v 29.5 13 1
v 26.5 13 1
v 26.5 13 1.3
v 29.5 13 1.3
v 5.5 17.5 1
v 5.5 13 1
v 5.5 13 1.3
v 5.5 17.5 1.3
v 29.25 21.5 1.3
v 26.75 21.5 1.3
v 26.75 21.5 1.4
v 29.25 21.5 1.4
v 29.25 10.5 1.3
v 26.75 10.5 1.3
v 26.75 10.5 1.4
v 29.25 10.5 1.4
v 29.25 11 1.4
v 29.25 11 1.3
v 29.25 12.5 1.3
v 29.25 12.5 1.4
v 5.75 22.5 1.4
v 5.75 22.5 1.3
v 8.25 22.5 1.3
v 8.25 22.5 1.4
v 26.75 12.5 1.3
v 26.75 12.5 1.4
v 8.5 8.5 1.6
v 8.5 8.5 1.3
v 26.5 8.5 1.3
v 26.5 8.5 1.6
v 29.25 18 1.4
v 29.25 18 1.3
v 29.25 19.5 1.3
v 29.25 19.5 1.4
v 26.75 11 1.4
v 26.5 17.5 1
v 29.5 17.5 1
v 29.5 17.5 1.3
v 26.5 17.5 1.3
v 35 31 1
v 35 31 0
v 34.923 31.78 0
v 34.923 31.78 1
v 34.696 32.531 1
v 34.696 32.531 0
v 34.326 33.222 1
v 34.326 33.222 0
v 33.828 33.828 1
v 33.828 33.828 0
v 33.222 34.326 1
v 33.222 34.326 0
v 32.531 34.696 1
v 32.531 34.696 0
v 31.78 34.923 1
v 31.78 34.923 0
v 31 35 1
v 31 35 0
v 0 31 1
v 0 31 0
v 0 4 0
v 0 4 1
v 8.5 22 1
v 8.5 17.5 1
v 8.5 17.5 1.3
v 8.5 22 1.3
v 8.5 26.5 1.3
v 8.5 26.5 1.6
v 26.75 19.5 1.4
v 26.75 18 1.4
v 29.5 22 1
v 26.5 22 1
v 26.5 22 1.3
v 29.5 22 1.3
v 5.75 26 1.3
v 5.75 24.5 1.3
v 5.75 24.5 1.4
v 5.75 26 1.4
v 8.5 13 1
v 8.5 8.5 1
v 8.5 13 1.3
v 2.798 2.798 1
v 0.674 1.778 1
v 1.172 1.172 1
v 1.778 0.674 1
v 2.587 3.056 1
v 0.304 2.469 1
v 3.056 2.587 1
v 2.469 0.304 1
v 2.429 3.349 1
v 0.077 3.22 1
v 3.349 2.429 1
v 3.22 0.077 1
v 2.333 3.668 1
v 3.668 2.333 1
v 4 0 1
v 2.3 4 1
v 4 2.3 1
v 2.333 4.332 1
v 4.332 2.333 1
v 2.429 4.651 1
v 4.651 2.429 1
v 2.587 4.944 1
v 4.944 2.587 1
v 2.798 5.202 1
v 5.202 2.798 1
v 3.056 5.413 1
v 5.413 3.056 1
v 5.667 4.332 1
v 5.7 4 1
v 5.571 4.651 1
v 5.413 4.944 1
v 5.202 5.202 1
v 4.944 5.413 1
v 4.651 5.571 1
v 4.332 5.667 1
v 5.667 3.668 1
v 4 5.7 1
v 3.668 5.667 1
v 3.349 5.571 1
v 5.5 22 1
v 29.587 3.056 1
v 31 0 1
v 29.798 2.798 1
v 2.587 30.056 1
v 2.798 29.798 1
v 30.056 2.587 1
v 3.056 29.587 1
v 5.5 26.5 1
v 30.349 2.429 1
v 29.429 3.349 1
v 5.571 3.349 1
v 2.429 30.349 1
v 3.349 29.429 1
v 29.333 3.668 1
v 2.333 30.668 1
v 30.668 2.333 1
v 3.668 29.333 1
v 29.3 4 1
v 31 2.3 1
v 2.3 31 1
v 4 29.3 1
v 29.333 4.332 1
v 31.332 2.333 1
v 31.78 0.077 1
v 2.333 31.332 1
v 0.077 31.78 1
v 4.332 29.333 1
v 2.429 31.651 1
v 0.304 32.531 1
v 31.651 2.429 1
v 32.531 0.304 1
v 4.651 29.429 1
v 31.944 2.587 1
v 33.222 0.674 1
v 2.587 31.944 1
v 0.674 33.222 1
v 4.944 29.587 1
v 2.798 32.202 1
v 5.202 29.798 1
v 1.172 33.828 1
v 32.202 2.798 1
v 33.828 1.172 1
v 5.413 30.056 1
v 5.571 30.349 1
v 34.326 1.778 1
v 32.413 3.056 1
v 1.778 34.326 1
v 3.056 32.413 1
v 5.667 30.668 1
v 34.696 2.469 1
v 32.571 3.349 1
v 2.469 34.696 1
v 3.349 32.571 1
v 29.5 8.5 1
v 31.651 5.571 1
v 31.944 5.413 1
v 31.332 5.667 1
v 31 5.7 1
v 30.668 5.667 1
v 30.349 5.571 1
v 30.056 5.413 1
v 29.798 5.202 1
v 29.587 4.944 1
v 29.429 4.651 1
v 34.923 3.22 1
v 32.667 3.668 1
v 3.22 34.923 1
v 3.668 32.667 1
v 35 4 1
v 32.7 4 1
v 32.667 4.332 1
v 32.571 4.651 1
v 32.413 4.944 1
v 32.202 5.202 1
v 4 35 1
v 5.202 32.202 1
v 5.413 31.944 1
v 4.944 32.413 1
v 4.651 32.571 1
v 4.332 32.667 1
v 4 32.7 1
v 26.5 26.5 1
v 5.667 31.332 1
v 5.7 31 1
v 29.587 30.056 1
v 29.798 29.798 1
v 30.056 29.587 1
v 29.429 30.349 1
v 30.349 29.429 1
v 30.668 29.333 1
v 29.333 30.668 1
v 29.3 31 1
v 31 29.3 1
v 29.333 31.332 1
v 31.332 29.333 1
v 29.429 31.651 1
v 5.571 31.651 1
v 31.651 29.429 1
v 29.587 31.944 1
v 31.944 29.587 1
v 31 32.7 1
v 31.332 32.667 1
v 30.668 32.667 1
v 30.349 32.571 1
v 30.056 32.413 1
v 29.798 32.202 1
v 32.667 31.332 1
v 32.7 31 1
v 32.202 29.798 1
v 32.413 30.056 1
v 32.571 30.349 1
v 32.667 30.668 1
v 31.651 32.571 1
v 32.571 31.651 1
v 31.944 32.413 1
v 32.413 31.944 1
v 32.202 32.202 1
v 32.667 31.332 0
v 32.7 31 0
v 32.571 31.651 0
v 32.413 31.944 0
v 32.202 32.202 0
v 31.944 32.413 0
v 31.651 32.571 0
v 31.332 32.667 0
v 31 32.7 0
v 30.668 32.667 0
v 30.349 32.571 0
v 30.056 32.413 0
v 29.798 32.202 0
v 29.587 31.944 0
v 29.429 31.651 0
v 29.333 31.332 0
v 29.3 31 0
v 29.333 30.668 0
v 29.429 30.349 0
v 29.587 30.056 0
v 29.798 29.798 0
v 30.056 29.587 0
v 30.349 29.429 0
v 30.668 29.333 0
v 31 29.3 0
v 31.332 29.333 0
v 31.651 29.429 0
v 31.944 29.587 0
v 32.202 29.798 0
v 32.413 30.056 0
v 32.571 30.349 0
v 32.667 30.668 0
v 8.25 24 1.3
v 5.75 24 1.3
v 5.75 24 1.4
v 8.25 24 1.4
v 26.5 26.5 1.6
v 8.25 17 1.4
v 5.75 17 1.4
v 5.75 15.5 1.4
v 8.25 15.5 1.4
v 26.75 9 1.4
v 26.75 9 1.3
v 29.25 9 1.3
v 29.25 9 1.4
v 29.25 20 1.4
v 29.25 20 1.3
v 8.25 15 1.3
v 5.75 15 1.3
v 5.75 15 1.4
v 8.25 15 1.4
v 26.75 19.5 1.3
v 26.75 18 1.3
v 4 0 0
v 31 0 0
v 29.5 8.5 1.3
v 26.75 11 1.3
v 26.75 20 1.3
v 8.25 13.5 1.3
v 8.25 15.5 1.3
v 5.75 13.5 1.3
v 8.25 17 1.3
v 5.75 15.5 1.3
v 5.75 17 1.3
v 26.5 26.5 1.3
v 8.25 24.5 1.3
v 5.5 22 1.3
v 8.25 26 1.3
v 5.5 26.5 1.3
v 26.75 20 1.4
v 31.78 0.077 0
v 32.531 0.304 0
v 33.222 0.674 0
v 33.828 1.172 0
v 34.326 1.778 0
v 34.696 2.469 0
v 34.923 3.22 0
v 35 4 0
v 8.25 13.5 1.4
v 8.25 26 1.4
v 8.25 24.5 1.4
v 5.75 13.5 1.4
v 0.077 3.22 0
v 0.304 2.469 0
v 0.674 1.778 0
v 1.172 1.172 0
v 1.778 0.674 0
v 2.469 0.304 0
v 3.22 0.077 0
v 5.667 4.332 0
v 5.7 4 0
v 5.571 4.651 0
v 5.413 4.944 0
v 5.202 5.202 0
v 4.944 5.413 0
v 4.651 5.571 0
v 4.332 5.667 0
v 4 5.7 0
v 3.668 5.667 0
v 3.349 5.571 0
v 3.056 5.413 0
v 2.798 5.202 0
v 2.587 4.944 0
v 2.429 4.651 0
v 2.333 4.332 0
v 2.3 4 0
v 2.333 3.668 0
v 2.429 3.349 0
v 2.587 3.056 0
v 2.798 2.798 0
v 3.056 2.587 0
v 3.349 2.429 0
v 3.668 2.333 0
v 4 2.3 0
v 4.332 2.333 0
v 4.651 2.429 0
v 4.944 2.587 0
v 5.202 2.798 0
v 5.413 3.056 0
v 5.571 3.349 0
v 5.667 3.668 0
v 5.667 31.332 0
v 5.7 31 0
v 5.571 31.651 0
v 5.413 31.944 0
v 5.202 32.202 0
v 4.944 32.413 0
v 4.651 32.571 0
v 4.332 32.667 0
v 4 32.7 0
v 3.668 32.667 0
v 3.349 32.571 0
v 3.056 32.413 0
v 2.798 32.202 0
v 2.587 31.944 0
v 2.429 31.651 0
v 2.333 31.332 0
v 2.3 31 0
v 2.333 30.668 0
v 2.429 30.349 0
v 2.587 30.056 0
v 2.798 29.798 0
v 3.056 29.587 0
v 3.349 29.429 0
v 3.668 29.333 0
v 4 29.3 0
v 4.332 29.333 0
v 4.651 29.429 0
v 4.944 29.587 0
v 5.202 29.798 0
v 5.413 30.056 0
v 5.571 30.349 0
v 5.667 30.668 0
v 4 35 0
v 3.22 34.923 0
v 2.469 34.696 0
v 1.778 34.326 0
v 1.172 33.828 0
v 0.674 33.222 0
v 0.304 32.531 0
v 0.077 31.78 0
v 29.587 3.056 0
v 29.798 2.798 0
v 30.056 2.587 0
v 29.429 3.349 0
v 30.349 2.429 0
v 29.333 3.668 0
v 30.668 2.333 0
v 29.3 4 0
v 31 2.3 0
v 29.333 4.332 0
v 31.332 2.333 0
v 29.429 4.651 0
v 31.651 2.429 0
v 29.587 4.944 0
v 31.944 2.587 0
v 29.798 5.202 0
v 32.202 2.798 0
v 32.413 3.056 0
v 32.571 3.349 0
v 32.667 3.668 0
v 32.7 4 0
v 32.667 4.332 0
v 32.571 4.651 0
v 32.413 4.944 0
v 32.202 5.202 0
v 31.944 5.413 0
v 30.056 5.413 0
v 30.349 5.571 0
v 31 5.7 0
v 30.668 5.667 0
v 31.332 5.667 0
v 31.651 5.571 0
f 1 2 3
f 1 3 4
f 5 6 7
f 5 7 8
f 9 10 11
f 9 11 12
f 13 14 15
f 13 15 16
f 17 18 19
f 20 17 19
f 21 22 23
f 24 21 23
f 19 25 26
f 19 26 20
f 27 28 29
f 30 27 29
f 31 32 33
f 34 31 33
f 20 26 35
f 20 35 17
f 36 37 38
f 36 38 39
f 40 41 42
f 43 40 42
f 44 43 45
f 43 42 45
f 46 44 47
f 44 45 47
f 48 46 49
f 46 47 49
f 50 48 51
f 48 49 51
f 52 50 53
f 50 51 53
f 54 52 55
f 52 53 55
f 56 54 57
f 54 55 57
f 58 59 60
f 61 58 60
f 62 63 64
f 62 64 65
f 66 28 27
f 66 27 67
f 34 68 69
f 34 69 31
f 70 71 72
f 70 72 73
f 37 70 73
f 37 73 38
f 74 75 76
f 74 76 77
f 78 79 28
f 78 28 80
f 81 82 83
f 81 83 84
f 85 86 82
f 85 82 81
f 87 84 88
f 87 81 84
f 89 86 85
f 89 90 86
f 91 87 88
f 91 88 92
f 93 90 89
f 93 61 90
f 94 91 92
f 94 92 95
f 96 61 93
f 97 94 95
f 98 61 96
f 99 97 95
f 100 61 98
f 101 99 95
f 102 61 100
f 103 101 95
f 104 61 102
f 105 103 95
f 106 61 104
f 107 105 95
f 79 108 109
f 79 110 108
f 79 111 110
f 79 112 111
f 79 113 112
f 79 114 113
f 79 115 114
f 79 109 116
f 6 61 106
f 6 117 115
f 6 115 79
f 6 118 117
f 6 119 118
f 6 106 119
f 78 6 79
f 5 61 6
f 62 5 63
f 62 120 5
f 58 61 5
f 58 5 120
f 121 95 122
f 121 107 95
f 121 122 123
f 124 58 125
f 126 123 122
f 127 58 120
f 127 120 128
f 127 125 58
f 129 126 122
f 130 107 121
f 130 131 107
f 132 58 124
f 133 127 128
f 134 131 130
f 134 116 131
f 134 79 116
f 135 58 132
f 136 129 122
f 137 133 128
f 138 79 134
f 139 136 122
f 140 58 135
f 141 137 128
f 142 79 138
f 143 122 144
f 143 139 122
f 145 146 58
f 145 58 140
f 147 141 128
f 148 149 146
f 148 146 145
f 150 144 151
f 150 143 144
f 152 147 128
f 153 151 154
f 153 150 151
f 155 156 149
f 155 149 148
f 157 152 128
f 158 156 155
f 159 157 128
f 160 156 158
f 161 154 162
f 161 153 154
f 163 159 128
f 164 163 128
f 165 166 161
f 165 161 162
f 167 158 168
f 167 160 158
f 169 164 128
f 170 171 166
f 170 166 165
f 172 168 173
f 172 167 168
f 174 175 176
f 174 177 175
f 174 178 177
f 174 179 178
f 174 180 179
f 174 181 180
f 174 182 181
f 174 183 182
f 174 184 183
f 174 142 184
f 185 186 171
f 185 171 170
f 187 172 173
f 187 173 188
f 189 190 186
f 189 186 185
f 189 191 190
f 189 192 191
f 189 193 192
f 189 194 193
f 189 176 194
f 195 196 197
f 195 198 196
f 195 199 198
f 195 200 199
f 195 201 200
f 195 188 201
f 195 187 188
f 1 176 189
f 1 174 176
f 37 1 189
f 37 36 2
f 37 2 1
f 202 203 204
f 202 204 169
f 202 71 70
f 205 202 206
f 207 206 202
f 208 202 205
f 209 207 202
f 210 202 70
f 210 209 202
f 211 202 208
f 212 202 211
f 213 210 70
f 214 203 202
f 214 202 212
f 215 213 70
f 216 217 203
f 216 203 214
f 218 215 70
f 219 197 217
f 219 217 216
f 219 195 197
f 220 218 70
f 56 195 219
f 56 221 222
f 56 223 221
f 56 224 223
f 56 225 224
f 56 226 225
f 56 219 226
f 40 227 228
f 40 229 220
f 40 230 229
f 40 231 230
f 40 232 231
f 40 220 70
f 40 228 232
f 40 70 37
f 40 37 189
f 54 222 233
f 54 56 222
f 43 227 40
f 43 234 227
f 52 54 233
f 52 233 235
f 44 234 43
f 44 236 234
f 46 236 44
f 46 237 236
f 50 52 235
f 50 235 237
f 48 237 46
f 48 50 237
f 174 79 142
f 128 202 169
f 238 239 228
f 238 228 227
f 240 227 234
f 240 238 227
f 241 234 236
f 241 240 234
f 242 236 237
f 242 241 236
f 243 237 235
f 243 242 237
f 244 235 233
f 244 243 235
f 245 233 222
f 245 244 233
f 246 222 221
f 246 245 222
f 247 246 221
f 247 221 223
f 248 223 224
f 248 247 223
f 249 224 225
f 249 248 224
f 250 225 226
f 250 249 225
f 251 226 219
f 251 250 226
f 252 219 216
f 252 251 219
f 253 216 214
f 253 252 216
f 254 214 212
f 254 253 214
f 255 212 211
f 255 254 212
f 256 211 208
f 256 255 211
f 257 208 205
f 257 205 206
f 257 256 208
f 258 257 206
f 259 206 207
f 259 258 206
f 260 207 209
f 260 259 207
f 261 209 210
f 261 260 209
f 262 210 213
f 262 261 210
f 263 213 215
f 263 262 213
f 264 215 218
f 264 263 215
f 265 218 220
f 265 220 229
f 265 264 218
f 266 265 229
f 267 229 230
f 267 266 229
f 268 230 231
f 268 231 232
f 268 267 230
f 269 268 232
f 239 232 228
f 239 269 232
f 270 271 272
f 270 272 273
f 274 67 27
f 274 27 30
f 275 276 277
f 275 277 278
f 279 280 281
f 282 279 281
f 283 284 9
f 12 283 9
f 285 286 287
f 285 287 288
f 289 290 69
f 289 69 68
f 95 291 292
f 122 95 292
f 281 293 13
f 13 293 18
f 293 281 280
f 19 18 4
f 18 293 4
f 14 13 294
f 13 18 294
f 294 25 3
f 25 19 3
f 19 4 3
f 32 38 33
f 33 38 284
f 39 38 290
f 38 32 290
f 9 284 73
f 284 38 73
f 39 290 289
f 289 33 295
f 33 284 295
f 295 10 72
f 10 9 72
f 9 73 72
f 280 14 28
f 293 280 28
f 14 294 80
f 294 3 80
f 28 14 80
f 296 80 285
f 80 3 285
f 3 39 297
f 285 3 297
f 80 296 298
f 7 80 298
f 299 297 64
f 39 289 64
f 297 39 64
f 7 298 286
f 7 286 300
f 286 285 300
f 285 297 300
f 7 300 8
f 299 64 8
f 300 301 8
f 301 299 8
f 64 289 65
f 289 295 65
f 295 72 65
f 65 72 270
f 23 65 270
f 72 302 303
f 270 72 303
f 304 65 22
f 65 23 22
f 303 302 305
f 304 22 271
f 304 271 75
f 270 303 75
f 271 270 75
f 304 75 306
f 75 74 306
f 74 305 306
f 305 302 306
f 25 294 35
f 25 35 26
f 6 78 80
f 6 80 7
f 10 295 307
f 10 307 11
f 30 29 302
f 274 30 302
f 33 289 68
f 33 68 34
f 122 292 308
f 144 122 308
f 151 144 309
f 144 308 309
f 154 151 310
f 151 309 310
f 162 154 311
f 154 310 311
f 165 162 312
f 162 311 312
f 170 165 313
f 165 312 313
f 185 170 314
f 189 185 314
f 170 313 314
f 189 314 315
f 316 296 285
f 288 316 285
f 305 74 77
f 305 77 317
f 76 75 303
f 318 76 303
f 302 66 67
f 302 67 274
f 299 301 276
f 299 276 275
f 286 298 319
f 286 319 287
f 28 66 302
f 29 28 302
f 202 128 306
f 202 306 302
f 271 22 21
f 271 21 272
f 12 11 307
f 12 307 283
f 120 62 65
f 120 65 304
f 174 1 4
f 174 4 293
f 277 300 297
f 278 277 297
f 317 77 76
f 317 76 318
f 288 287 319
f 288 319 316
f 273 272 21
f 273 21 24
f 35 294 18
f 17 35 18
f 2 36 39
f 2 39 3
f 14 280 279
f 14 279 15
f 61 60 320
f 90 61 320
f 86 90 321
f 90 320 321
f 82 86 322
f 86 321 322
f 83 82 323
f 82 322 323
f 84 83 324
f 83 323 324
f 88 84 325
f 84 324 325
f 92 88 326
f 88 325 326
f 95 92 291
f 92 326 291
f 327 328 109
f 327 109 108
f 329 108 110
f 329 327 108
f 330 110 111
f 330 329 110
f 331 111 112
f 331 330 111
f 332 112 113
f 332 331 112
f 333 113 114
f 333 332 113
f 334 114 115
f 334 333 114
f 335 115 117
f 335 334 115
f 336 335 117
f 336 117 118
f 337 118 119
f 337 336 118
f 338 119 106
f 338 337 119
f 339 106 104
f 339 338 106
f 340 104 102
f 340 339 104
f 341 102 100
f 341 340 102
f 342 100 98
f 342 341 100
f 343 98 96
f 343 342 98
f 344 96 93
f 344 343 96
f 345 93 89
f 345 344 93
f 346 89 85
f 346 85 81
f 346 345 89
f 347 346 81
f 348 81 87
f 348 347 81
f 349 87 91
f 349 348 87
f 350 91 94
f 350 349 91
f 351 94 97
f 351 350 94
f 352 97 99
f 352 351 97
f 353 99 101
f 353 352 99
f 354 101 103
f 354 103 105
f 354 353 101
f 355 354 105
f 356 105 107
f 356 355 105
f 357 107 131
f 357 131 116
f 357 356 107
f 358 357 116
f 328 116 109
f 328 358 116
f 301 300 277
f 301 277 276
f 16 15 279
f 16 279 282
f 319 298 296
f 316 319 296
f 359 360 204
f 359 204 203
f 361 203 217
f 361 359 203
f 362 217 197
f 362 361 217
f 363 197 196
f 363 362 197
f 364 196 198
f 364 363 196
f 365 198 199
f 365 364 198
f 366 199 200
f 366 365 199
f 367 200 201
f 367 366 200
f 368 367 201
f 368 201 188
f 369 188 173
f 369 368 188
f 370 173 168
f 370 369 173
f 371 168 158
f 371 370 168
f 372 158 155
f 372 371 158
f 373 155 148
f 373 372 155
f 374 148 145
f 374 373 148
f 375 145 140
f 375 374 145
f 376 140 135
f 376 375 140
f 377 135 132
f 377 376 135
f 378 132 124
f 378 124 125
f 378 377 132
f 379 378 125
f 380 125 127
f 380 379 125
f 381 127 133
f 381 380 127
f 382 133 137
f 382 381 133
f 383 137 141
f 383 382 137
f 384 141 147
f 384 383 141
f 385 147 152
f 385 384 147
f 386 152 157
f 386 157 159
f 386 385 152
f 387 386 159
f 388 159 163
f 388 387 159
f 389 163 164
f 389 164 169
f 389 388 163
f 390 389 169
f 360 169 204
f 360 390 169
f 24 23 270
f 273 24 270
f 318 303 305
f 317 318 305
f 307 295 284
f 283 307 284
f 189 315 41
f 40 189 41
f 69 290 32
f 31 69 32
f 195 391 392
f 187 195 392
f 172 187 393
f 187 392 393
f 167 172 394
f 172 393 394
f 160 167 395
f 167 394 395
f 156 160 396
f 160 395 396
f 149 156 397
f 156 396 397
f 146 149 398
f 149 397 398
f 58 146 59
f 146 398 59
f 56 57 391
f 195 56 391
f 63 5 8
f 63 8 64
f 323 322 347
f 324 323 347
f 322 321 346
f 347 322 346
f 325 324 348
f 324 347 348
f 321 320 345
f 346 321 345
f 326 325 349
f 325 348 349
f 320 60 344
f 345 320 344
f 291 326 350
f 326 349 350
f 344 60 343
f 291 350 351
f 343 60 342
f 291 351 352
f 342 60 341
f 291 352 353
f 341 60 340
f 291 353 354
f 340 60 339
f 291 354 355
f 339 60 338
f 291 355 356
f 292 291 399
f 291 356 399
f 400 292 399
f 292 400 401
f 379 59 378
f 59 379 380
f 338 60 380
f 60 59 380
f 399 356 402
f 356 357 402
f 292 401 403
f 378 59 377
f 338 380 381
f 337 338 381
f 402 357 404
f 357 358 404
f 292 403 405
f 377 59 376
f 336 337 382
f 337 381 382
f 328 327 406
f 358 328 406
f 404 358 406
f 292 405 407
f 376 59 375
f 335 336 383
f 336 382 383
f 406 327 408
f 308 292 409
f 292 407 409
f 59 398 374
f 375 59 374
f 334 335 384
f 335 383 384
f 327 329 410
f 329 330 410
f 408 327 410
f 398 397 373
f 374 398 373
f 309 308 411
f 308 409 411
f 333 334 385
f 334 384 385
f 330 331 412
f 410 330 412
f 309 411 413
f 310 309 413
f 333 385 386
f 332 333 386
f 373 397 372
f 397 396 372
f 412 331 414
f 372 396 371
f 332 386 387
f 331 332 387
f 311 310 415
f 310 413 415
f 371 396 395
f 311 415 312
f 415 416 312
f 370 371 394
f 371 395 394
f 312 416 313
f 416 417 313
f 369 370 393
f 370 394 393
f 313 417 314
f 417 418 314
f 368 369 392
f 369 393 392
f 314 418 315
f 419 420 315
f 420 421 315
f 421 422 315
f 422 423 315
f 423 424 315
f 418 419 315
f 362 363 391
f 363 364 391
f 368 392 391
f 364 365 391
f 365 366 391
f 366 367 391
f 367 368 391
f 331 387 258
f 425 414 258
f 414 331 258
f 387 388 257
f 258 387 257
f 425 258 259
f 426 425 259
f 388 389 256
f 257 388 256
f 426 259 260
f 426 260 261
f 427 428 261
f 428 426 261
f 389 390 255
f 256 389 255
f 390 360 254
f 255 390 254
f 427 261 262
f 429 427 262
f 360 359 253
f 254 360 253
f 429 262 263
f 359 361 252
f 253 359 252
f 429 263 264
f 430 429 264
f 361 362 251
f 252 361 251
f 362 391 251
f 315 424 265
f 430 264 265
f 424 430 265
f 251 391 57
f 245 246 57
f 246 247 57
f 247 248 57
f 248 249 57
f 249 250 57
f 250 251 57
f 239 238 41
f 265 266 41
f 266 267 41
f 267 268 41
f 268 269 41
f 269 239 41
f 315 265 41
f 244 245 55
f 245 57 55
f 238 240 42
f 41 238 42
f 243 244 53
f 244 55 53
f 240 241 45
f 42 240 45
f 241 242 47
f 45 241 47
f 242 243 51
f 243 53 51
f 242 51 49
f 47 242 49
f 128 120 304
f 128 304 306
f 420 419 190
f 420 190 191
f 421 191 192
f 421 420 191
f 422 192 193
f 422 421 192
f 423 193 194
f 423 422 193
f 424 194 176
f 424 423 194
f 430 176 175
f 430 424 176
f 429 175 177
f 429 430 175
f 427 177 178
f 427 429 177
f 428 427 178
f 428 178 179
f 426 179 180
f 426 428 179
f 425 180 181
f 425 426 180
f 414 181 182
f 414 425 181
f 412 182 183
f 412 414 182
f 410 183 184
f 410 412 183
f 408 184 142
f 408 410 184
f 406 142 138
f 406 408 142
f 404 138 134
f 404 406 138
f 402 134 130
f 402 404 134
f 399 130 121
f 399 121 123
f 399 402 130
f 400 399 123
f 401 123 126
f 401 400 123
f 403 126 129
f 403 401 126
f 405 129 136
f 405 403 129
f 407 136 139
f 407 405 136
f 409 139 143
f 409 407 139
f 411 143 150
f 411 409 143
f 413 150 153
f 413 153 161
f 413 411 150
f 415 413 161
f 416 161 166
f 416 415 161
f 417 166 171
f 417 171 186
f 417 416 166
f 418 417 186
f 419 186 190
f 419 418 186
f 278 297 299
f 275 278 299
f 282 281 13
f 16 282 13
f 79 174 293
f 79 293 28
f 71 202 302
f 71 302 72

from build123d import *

# Parameters (mm, degrees)
SKETCH_20_R         = 1.7
BOSS_EXTRUDE1_DEPTH = 1
BOSS_EXTRUDE2_DEPTH = 0.3
SKETCH1_W           = 18
SKETCH1_H           = 18
BOSS_EXTRUDE3_DEPTH = 0.3
SKETCH2_W           = 2.5
SKETCH2_H           = 1.5
BOSS_EXTRUDE4_DEPTH = 0.1


with BuildPart() as part:
    # Sketch 20 → Boss-Extrude1 (new body)
    with BuildSketch(Plane.XY):
        with BuildLine():
            Line((4, 0), (31, 0))
            ThreePointArc((31, 0), (33.828427125, 1.171572875), (35, 4))
            Line((35, 4), (35, 31))
            ThreePointArc((35, 31), (33.828427125, 33.828427125), (31, 35))
            Line((31, 35), (4, 35))
            ThreePointArc((4, 35), (1.171572875, 33.828427125), (0, 31))
            Line((0, 31), (0, 4))
            ThreePointArc((0, 4), (1.171572875, 1.171572875), (4, 0))
        make_face()
        with Locations((4, 4)):
            Circle(SKETCH_20_R, mode=Mode.SUBTRACT)
        with Locations((31, 4)):
            Circle(SKETCH_20_R, mode=Mode.SUBTRACT)
        with Locations((31, 31)):
            Circle(SKETCH_20_R, mode=Mode.SUBTRACT)
        with Locations((4, 31)):
            Circle(SKETCH_20_R, mode=Mode.SUBTRACT)
    extrude(amount=BOSS_EXTRUDE1_DEPTH)

    # Sketch 29 → Boss-Extrude2 (add)
    with BuildSketch(Plane.XY.offset(1)):
        Polygon((29.5, 8.5), (8.5, 8.5), (8.5, 13), (5.5, 13), (5.5, 17.5), (8.5, 17.5), (8.5, 22), (5.5, 22), (5.5, 26.5), (26.5, 26.5), (26.5, 22), (29.5, 22), (29.5, 17.5), (26.5, 17.5), (26.5, 13), (29.5, 13), align=None)
    extrude(amount=BOSS_EXTRUDE2_DEPTH)

    # Sketch2 → Boss-Extrude4 (add)
    with BuildSketch(Plane.XY.offset(1.3)):
        with Locations((28, 9.75)):
            Rectangle(SKETCH2_W, SKETCH2_H)
        with Locations((28, 11.75)):
            Rectangle(SKETCH2_W, SKETCH2_H)
        with Locations((28, 18.75)):
            Rectangle(SKETCH2_W, SKETCH2_H)
        with Locations((28, 20.75)):
            Rectangle(SKETCH2_W, SKETCH2_H)
        with Locations((7, 14.25)):
            Rectangle(SKETCH2_W, SKETCH2_H)
        with Locations((7, 23.25)):
            Rectangle(SKETCH2_W, SKETCH2_H)
        with Locations((7, 16.25)):
            Rectangle(SKETCH2_W, SKETCH2_H)
        with Locations((7, 25.25)):
            Rectangle(SKETCH2_W, SKETCH2_H)
    extrude(amount=BOSS_EXTRUDE4_DEPTH)


with BuildPart() as body_2:
    # Sketch1 → Boss-Extrude3 (new body)
    with BuildSketch(Plane.XY.offset(1.3)):
        with Locations((17.5, 17.5)):
            Rectangle(SKETCH1_W, SKETCH1_H)
    extrude(amount=BOSS_EXTRUDE3_DEPTH)


solid = Compound([part.part, body_2.part])
